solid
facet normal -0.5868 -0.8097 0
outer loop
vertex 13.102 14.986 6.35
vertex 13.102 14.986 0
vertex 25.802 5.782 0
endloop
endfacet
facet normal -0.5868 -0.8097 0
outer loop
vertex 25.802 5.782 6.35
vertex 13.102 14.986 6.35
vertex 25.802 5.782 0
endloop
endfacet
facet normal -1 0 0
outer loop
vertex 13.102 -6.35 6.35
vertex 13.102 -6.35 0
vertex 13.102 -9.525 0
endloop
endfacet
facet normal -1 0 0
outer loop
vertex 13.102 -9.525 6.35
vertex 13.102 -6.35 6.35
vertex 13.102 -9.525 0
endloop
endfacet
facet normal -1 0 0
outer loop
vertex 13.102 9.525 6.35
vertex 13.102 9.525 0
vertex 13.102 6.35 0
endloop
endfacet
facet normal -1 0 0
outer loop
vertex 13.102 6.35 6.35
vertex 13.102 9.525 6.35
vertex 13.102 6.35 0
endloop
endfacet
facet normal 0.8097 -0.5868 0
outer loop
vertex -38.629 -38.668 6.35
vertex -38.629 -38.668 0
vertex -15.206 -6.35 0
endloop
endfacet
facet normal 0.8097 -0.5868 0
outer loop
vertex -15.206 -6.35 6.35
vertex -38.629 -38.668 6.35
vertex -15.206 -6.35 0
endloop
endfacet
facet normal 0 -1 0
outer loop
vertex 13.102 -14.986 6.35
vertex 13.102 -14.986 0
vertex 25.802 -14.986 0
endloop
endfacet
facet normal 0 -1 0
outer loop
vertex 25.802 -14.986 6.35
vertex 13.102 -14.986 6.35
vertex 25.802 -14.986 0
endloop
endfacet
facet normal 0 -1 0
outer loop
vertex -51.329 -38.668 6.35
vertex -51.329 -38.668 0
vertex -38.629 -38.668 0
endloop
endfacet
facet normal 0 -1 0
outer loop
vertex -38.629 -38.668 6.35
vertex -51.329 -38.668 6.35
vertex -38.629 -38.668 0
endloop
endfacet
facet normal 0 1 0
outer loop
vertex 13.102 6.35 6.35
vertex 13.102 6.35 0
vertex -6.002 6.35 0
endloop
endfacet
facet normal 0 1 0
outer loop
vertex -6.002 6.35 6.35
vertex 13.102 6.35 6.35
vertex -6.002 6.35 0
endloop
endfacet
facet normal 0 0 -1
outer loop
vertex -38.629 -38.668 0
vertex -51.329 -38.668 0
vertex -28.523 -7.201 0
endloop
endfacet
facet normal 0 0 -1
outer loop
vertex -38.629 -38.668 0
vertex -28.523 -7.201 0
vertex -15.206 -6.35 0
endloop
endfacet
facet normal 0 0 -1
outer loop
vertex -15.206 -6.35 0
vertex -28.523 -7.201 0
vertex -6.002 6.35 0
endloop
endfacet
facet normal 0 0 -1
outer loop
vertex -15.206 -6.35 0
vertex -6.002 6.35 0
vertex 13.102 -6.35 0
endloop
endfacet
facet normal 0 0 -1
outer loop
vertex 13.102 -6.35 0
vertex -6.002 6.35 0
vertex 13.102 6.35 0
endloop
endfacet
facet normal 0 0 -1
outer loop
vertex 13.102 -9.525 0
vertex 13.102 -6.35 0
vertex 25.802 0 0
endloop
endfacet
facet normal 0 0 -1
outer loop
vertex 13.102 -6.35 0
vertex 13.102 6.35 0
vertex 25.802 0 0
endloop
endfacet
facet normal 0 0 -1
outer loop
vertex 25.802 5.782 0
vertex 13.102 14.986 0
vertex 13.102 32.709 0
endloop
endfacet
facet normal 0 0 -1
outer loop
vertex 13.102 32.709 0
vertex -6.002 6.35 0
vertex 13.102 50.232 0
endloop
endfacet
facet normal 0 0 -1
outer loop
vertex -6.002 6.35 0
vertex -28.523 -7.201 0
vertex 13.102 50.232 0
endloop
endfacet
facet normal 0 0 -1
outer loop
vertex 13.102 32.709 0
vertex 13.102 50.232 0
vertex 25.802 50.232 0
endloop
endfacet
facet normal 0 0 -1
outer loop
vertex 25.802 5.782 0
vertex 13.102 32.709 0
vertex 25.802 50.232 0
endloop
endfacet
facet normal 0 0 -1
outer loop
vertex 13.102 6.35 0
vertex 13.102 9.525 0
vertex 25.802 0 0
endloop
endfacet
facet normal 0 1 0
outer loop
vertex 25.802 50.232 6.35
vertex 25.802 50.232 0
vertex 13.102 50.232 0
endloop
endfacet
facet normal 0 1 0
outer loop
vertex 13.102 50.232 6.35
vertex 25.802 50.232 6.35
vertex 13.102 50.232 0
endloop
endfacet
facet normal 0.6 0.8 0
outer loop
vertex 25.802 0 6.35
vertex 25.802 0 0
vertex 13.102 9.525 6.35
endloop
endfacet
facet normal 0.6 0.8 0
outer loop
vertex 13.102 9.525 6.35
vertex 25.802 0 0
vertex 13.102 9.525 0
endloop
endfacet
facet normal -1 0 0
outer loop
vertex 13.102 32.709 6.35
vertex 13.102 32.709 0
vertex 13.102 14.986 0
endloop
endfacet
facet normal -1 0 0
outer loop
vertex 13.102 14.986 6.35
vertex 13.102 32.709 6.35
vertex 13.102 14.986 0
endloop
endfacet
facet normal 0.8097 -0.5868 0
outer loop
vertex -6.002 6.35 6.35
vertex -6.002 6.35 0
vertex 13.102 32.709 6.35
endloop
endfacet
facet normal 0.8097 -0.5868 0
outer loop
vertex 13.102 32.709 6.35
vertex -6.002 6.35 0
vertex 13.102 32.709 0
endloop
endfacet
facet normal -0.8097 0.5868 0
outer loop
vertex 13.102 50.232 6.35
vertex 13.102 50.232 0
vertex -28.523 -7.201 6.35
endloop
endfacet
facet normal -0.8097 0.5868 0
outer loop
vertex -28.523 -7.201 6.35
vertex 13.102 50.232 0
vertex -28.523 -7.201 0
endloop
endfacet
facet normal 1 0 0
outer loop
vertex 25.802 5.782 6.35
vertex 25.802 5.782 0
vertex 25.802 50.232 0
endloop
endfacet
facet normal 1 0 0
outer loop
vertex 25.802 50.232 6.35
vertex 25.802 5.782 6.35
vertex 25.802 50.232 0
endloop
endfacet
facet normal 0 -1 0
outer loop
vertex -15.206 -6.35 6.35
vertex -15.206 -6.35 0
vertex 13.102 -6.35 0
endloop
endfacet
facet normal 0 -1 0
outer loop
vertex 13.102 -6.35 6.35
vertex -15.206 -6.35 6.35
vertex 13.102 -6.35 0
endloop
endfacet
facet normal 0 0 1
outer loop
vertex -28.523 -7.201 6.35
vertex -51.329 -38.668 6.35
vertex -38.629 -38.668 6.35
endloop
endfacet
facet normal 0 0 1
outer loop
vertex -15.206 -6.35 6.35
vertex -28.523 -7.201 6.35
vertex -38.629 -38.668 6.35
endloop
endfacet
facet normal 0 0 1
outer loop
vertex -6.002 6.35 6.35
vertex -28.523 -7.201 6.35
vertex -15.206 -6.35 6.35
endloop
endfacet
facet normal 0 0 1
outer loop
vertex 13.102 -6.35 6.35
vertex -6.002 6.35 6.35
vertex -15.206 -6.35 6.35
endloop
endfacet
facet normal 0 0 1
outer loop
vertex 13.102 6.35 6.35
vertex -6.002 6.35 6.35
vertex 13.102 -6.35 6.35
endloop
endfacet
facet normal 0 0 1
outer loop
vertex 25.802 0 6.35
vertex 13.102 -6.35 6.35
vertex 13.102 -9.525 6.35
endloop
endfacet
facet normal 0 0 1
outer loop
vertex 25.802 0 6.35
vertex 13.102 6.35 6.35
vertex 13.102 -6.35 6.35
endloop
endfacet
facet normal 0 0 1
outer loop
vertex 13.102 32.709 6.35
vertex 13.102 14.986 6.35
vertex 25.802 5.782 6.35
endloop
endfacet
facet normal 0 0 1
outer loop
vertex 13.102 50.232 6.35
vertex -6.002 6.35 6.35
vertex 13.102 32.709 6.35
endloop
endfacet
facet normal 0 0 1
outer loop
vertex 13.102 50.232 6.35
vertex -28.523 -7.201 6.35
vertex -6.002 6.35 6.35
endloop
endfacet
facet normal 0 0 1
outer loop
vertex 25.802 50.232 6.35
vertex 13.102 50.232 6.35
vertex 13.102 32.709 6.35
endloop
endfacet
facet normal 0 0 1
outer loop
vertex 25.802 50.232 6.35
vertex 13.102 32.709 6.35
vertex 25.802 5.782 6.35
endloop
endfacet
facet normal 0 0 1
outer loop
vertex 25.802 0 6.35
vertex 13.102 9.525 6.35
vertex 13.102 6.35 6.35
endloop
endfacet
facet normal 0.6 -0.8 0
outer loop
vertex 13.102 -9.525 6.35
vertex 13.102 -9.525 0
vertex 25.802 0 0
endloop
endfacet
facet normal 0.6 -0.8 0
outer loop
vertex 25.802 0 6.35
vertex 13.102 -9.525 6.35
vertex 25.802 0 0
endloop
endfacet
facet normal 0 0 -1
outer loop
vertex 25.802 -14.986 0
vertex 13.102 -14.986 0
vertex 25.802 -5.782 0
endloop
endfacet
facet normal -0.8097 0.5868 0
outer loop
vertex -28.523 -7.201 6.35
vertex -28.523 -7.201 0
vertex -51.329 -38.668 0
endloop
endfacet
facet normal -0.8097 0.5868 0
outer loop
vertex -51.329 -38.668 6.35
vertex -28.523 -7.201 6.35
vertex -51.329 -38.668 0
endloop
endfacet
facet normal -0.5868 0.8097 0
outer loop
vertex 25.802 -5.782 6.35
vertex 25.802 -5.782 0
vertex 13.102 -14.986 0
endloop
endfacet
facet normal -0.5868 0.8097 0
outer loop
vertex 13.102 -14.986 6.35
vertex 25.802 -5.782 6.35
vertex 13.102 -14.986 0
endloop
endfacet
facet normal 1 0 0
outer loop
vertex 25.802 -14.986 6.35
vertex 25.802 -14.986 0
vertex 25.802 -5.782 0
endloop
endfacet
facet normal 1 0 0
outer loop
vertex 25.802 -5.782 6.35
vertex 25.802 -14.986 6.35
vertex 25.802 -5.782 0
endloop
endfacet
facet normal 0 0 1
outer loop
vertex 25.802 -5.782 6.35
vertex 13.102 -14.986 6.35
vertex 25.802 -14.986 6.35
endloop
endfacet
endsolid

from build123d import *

# Parameters (mm, degrees)
F1_DEPTH = 6.35


with BuildPart() as f1:
    # F0 (on Top) → F1 (new body)
    with BuildSketch(Plane.XY):
        Polygon((-28.522962, -7.201005), (-51.329319, -38.668455), (-38.629319, -38.668455), (-15.206187, -6.35), (13.101868, -6.35), (13.101868, -9.525), (25.801868, 0), (13.101868, 9.525), (13.101868, 6.35), (-6.001732, 6.35), (13.101868, 32.708509), (13.101868, 14.986), (25.801868, 5.781545), (25.801868, 50.231545), (13.101868, 50.231545), align=None)
        Polygon((13.101868, -14.986), (25.801868, -14.986), (25.801868, -5.781545), align=None)
    extrude(amount=F1_DEPTH)


solid = f1.part
